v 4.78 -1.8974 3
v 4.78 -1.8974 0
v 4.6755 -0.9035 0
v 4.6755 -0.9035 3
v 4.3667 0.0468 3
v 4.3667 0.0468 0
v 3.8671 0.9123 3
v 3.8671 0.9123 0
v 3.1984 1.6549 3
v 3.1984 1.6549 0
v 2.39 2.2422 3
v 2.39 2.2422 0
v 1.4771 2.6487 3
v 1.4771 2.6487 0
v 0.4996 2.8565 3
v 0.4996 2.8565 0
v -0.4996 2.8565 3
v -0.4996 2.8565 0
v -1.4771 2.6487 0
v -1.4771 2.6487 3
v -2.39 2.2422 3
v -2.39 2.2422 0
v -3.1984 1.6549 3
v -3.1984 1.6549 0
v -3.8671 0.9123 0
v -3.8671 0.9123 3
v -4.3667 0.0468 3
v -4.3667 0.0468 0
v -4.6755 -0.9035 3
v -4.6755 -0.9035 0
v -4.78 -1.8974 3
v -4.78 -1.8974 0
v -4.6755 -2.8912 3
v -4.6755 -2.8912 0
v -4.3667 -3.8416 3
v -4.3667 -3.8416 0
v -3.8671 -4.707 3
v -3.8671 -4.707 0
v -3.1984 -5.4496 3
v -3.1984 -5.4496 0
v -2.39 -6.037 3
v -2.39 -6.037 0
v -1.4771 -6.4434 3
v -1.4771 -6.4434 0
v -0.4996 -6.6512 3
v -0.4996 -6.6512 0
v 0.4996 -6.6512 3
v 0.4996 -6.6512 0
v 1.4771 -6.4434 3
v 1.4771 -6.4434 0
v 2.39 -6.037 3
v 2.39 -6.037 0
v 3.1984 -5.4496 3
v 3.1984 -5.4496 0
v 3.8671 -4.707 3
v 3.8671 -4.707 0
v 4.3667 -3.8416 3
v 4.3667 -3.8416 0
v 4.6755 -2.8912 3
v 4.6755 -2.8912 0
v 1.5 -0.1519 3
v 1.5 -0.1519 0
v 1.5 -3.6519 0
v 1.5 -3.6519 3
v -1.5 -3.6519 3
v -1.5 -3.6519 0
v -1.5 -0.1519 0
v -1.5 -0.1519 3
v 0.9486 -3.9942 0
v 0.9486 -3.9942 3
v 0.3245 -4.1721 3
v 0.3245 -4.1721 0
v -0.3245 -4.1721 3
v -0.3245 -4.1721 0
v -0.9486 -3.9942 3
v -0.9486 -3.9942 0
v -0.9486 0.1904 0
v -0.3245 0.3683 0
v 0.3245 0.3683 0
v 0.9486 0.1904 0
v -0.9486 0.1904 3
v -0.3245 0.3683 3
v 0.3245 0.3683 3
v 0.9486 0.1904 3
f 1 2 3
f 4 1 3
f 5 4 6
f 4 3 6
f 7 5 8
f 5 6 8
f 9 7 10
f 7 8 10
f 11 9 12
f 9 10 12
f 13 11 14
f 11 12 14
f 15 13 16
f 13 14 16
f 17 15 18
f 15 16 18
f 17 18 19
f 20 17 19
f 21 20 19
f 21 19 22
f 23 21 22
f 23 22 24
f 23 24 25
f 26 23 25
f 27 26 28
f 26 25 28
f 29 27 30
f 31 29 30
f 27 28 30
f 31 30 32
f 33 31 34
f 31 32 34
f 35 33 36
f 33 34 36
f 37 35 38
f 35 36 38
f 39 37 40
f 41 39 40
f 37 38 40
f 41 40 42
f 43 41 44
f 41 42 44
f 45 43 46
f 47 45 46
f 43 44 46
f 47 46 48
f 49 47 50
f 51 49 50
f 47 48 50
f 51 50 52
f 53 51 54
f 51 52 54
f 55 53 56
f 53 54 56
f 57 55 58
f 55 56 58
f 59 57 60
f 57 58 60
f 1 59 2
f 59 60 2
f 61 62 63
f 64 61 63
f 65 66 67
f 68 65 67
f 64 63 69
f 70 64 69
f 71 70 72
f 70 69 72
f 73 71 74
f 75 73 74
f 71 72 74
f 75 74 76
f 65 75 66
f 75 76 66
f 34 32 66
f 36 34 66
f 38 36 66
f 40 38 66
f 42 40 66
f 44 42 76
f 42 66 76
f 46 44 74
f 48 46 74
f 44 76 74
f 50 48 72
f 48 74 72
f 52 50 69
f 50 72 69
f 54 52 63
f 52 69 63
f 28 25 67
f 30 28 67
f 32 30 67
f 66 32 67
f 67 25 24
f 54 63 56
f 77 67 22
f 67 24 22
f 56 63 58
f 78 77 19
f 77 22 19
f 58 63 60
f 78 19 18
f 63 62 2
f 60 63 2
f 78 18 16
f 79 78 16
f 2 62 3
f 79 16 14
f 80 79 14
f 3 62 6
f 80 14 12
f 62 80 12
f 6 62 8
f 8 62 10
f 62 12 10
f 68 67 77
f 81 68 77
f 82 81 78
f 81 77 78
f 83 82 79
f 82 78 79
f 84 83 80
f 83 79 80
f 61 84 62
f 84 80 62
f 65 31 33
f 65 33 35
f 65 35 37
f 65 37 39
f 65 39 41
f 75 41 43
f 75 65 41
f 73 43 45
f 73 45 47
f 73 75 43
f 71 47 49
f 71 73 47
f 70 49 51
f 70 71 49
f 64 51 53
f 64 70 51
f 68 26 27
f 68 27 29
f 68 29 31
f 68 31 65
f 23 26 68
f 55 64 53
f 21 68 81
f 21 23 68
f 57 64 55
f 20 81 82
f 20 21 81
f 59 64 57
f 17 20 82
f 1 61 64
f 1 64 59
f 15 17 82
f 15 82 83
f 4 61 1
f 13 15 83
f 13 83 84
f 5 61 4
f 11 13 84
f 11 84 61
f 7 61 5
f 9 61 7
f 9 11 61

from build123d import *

# Parameters (mm, degrees)
F0_R     = 4.78
F1_DEPTH = 3


with BuildPart() as f1:
    # F0 (on Top) → F1 (new body)
    with BuildSketch(Plane.XY):
        with Locations((0, -1.897358)):
            Circle(F0_R)
        with BuildLine():
            Line((-1.5, -3.651894), (-1.5, -0.151894))
            ThreePointArc((-1.5, -0.151894), (0, 0.390902), (1.5, -0.151894))
            Line((1.5, -0.151894), (1.5, -3.651894))
            ThreePointArc((1.5, -3.651894), (0, -4.19469), (-1.5, -3.651894))
        make_face(mode=Mode.SUBTRACT)
    extrude(amount=F1_DEPTH)


solid = f1.part
